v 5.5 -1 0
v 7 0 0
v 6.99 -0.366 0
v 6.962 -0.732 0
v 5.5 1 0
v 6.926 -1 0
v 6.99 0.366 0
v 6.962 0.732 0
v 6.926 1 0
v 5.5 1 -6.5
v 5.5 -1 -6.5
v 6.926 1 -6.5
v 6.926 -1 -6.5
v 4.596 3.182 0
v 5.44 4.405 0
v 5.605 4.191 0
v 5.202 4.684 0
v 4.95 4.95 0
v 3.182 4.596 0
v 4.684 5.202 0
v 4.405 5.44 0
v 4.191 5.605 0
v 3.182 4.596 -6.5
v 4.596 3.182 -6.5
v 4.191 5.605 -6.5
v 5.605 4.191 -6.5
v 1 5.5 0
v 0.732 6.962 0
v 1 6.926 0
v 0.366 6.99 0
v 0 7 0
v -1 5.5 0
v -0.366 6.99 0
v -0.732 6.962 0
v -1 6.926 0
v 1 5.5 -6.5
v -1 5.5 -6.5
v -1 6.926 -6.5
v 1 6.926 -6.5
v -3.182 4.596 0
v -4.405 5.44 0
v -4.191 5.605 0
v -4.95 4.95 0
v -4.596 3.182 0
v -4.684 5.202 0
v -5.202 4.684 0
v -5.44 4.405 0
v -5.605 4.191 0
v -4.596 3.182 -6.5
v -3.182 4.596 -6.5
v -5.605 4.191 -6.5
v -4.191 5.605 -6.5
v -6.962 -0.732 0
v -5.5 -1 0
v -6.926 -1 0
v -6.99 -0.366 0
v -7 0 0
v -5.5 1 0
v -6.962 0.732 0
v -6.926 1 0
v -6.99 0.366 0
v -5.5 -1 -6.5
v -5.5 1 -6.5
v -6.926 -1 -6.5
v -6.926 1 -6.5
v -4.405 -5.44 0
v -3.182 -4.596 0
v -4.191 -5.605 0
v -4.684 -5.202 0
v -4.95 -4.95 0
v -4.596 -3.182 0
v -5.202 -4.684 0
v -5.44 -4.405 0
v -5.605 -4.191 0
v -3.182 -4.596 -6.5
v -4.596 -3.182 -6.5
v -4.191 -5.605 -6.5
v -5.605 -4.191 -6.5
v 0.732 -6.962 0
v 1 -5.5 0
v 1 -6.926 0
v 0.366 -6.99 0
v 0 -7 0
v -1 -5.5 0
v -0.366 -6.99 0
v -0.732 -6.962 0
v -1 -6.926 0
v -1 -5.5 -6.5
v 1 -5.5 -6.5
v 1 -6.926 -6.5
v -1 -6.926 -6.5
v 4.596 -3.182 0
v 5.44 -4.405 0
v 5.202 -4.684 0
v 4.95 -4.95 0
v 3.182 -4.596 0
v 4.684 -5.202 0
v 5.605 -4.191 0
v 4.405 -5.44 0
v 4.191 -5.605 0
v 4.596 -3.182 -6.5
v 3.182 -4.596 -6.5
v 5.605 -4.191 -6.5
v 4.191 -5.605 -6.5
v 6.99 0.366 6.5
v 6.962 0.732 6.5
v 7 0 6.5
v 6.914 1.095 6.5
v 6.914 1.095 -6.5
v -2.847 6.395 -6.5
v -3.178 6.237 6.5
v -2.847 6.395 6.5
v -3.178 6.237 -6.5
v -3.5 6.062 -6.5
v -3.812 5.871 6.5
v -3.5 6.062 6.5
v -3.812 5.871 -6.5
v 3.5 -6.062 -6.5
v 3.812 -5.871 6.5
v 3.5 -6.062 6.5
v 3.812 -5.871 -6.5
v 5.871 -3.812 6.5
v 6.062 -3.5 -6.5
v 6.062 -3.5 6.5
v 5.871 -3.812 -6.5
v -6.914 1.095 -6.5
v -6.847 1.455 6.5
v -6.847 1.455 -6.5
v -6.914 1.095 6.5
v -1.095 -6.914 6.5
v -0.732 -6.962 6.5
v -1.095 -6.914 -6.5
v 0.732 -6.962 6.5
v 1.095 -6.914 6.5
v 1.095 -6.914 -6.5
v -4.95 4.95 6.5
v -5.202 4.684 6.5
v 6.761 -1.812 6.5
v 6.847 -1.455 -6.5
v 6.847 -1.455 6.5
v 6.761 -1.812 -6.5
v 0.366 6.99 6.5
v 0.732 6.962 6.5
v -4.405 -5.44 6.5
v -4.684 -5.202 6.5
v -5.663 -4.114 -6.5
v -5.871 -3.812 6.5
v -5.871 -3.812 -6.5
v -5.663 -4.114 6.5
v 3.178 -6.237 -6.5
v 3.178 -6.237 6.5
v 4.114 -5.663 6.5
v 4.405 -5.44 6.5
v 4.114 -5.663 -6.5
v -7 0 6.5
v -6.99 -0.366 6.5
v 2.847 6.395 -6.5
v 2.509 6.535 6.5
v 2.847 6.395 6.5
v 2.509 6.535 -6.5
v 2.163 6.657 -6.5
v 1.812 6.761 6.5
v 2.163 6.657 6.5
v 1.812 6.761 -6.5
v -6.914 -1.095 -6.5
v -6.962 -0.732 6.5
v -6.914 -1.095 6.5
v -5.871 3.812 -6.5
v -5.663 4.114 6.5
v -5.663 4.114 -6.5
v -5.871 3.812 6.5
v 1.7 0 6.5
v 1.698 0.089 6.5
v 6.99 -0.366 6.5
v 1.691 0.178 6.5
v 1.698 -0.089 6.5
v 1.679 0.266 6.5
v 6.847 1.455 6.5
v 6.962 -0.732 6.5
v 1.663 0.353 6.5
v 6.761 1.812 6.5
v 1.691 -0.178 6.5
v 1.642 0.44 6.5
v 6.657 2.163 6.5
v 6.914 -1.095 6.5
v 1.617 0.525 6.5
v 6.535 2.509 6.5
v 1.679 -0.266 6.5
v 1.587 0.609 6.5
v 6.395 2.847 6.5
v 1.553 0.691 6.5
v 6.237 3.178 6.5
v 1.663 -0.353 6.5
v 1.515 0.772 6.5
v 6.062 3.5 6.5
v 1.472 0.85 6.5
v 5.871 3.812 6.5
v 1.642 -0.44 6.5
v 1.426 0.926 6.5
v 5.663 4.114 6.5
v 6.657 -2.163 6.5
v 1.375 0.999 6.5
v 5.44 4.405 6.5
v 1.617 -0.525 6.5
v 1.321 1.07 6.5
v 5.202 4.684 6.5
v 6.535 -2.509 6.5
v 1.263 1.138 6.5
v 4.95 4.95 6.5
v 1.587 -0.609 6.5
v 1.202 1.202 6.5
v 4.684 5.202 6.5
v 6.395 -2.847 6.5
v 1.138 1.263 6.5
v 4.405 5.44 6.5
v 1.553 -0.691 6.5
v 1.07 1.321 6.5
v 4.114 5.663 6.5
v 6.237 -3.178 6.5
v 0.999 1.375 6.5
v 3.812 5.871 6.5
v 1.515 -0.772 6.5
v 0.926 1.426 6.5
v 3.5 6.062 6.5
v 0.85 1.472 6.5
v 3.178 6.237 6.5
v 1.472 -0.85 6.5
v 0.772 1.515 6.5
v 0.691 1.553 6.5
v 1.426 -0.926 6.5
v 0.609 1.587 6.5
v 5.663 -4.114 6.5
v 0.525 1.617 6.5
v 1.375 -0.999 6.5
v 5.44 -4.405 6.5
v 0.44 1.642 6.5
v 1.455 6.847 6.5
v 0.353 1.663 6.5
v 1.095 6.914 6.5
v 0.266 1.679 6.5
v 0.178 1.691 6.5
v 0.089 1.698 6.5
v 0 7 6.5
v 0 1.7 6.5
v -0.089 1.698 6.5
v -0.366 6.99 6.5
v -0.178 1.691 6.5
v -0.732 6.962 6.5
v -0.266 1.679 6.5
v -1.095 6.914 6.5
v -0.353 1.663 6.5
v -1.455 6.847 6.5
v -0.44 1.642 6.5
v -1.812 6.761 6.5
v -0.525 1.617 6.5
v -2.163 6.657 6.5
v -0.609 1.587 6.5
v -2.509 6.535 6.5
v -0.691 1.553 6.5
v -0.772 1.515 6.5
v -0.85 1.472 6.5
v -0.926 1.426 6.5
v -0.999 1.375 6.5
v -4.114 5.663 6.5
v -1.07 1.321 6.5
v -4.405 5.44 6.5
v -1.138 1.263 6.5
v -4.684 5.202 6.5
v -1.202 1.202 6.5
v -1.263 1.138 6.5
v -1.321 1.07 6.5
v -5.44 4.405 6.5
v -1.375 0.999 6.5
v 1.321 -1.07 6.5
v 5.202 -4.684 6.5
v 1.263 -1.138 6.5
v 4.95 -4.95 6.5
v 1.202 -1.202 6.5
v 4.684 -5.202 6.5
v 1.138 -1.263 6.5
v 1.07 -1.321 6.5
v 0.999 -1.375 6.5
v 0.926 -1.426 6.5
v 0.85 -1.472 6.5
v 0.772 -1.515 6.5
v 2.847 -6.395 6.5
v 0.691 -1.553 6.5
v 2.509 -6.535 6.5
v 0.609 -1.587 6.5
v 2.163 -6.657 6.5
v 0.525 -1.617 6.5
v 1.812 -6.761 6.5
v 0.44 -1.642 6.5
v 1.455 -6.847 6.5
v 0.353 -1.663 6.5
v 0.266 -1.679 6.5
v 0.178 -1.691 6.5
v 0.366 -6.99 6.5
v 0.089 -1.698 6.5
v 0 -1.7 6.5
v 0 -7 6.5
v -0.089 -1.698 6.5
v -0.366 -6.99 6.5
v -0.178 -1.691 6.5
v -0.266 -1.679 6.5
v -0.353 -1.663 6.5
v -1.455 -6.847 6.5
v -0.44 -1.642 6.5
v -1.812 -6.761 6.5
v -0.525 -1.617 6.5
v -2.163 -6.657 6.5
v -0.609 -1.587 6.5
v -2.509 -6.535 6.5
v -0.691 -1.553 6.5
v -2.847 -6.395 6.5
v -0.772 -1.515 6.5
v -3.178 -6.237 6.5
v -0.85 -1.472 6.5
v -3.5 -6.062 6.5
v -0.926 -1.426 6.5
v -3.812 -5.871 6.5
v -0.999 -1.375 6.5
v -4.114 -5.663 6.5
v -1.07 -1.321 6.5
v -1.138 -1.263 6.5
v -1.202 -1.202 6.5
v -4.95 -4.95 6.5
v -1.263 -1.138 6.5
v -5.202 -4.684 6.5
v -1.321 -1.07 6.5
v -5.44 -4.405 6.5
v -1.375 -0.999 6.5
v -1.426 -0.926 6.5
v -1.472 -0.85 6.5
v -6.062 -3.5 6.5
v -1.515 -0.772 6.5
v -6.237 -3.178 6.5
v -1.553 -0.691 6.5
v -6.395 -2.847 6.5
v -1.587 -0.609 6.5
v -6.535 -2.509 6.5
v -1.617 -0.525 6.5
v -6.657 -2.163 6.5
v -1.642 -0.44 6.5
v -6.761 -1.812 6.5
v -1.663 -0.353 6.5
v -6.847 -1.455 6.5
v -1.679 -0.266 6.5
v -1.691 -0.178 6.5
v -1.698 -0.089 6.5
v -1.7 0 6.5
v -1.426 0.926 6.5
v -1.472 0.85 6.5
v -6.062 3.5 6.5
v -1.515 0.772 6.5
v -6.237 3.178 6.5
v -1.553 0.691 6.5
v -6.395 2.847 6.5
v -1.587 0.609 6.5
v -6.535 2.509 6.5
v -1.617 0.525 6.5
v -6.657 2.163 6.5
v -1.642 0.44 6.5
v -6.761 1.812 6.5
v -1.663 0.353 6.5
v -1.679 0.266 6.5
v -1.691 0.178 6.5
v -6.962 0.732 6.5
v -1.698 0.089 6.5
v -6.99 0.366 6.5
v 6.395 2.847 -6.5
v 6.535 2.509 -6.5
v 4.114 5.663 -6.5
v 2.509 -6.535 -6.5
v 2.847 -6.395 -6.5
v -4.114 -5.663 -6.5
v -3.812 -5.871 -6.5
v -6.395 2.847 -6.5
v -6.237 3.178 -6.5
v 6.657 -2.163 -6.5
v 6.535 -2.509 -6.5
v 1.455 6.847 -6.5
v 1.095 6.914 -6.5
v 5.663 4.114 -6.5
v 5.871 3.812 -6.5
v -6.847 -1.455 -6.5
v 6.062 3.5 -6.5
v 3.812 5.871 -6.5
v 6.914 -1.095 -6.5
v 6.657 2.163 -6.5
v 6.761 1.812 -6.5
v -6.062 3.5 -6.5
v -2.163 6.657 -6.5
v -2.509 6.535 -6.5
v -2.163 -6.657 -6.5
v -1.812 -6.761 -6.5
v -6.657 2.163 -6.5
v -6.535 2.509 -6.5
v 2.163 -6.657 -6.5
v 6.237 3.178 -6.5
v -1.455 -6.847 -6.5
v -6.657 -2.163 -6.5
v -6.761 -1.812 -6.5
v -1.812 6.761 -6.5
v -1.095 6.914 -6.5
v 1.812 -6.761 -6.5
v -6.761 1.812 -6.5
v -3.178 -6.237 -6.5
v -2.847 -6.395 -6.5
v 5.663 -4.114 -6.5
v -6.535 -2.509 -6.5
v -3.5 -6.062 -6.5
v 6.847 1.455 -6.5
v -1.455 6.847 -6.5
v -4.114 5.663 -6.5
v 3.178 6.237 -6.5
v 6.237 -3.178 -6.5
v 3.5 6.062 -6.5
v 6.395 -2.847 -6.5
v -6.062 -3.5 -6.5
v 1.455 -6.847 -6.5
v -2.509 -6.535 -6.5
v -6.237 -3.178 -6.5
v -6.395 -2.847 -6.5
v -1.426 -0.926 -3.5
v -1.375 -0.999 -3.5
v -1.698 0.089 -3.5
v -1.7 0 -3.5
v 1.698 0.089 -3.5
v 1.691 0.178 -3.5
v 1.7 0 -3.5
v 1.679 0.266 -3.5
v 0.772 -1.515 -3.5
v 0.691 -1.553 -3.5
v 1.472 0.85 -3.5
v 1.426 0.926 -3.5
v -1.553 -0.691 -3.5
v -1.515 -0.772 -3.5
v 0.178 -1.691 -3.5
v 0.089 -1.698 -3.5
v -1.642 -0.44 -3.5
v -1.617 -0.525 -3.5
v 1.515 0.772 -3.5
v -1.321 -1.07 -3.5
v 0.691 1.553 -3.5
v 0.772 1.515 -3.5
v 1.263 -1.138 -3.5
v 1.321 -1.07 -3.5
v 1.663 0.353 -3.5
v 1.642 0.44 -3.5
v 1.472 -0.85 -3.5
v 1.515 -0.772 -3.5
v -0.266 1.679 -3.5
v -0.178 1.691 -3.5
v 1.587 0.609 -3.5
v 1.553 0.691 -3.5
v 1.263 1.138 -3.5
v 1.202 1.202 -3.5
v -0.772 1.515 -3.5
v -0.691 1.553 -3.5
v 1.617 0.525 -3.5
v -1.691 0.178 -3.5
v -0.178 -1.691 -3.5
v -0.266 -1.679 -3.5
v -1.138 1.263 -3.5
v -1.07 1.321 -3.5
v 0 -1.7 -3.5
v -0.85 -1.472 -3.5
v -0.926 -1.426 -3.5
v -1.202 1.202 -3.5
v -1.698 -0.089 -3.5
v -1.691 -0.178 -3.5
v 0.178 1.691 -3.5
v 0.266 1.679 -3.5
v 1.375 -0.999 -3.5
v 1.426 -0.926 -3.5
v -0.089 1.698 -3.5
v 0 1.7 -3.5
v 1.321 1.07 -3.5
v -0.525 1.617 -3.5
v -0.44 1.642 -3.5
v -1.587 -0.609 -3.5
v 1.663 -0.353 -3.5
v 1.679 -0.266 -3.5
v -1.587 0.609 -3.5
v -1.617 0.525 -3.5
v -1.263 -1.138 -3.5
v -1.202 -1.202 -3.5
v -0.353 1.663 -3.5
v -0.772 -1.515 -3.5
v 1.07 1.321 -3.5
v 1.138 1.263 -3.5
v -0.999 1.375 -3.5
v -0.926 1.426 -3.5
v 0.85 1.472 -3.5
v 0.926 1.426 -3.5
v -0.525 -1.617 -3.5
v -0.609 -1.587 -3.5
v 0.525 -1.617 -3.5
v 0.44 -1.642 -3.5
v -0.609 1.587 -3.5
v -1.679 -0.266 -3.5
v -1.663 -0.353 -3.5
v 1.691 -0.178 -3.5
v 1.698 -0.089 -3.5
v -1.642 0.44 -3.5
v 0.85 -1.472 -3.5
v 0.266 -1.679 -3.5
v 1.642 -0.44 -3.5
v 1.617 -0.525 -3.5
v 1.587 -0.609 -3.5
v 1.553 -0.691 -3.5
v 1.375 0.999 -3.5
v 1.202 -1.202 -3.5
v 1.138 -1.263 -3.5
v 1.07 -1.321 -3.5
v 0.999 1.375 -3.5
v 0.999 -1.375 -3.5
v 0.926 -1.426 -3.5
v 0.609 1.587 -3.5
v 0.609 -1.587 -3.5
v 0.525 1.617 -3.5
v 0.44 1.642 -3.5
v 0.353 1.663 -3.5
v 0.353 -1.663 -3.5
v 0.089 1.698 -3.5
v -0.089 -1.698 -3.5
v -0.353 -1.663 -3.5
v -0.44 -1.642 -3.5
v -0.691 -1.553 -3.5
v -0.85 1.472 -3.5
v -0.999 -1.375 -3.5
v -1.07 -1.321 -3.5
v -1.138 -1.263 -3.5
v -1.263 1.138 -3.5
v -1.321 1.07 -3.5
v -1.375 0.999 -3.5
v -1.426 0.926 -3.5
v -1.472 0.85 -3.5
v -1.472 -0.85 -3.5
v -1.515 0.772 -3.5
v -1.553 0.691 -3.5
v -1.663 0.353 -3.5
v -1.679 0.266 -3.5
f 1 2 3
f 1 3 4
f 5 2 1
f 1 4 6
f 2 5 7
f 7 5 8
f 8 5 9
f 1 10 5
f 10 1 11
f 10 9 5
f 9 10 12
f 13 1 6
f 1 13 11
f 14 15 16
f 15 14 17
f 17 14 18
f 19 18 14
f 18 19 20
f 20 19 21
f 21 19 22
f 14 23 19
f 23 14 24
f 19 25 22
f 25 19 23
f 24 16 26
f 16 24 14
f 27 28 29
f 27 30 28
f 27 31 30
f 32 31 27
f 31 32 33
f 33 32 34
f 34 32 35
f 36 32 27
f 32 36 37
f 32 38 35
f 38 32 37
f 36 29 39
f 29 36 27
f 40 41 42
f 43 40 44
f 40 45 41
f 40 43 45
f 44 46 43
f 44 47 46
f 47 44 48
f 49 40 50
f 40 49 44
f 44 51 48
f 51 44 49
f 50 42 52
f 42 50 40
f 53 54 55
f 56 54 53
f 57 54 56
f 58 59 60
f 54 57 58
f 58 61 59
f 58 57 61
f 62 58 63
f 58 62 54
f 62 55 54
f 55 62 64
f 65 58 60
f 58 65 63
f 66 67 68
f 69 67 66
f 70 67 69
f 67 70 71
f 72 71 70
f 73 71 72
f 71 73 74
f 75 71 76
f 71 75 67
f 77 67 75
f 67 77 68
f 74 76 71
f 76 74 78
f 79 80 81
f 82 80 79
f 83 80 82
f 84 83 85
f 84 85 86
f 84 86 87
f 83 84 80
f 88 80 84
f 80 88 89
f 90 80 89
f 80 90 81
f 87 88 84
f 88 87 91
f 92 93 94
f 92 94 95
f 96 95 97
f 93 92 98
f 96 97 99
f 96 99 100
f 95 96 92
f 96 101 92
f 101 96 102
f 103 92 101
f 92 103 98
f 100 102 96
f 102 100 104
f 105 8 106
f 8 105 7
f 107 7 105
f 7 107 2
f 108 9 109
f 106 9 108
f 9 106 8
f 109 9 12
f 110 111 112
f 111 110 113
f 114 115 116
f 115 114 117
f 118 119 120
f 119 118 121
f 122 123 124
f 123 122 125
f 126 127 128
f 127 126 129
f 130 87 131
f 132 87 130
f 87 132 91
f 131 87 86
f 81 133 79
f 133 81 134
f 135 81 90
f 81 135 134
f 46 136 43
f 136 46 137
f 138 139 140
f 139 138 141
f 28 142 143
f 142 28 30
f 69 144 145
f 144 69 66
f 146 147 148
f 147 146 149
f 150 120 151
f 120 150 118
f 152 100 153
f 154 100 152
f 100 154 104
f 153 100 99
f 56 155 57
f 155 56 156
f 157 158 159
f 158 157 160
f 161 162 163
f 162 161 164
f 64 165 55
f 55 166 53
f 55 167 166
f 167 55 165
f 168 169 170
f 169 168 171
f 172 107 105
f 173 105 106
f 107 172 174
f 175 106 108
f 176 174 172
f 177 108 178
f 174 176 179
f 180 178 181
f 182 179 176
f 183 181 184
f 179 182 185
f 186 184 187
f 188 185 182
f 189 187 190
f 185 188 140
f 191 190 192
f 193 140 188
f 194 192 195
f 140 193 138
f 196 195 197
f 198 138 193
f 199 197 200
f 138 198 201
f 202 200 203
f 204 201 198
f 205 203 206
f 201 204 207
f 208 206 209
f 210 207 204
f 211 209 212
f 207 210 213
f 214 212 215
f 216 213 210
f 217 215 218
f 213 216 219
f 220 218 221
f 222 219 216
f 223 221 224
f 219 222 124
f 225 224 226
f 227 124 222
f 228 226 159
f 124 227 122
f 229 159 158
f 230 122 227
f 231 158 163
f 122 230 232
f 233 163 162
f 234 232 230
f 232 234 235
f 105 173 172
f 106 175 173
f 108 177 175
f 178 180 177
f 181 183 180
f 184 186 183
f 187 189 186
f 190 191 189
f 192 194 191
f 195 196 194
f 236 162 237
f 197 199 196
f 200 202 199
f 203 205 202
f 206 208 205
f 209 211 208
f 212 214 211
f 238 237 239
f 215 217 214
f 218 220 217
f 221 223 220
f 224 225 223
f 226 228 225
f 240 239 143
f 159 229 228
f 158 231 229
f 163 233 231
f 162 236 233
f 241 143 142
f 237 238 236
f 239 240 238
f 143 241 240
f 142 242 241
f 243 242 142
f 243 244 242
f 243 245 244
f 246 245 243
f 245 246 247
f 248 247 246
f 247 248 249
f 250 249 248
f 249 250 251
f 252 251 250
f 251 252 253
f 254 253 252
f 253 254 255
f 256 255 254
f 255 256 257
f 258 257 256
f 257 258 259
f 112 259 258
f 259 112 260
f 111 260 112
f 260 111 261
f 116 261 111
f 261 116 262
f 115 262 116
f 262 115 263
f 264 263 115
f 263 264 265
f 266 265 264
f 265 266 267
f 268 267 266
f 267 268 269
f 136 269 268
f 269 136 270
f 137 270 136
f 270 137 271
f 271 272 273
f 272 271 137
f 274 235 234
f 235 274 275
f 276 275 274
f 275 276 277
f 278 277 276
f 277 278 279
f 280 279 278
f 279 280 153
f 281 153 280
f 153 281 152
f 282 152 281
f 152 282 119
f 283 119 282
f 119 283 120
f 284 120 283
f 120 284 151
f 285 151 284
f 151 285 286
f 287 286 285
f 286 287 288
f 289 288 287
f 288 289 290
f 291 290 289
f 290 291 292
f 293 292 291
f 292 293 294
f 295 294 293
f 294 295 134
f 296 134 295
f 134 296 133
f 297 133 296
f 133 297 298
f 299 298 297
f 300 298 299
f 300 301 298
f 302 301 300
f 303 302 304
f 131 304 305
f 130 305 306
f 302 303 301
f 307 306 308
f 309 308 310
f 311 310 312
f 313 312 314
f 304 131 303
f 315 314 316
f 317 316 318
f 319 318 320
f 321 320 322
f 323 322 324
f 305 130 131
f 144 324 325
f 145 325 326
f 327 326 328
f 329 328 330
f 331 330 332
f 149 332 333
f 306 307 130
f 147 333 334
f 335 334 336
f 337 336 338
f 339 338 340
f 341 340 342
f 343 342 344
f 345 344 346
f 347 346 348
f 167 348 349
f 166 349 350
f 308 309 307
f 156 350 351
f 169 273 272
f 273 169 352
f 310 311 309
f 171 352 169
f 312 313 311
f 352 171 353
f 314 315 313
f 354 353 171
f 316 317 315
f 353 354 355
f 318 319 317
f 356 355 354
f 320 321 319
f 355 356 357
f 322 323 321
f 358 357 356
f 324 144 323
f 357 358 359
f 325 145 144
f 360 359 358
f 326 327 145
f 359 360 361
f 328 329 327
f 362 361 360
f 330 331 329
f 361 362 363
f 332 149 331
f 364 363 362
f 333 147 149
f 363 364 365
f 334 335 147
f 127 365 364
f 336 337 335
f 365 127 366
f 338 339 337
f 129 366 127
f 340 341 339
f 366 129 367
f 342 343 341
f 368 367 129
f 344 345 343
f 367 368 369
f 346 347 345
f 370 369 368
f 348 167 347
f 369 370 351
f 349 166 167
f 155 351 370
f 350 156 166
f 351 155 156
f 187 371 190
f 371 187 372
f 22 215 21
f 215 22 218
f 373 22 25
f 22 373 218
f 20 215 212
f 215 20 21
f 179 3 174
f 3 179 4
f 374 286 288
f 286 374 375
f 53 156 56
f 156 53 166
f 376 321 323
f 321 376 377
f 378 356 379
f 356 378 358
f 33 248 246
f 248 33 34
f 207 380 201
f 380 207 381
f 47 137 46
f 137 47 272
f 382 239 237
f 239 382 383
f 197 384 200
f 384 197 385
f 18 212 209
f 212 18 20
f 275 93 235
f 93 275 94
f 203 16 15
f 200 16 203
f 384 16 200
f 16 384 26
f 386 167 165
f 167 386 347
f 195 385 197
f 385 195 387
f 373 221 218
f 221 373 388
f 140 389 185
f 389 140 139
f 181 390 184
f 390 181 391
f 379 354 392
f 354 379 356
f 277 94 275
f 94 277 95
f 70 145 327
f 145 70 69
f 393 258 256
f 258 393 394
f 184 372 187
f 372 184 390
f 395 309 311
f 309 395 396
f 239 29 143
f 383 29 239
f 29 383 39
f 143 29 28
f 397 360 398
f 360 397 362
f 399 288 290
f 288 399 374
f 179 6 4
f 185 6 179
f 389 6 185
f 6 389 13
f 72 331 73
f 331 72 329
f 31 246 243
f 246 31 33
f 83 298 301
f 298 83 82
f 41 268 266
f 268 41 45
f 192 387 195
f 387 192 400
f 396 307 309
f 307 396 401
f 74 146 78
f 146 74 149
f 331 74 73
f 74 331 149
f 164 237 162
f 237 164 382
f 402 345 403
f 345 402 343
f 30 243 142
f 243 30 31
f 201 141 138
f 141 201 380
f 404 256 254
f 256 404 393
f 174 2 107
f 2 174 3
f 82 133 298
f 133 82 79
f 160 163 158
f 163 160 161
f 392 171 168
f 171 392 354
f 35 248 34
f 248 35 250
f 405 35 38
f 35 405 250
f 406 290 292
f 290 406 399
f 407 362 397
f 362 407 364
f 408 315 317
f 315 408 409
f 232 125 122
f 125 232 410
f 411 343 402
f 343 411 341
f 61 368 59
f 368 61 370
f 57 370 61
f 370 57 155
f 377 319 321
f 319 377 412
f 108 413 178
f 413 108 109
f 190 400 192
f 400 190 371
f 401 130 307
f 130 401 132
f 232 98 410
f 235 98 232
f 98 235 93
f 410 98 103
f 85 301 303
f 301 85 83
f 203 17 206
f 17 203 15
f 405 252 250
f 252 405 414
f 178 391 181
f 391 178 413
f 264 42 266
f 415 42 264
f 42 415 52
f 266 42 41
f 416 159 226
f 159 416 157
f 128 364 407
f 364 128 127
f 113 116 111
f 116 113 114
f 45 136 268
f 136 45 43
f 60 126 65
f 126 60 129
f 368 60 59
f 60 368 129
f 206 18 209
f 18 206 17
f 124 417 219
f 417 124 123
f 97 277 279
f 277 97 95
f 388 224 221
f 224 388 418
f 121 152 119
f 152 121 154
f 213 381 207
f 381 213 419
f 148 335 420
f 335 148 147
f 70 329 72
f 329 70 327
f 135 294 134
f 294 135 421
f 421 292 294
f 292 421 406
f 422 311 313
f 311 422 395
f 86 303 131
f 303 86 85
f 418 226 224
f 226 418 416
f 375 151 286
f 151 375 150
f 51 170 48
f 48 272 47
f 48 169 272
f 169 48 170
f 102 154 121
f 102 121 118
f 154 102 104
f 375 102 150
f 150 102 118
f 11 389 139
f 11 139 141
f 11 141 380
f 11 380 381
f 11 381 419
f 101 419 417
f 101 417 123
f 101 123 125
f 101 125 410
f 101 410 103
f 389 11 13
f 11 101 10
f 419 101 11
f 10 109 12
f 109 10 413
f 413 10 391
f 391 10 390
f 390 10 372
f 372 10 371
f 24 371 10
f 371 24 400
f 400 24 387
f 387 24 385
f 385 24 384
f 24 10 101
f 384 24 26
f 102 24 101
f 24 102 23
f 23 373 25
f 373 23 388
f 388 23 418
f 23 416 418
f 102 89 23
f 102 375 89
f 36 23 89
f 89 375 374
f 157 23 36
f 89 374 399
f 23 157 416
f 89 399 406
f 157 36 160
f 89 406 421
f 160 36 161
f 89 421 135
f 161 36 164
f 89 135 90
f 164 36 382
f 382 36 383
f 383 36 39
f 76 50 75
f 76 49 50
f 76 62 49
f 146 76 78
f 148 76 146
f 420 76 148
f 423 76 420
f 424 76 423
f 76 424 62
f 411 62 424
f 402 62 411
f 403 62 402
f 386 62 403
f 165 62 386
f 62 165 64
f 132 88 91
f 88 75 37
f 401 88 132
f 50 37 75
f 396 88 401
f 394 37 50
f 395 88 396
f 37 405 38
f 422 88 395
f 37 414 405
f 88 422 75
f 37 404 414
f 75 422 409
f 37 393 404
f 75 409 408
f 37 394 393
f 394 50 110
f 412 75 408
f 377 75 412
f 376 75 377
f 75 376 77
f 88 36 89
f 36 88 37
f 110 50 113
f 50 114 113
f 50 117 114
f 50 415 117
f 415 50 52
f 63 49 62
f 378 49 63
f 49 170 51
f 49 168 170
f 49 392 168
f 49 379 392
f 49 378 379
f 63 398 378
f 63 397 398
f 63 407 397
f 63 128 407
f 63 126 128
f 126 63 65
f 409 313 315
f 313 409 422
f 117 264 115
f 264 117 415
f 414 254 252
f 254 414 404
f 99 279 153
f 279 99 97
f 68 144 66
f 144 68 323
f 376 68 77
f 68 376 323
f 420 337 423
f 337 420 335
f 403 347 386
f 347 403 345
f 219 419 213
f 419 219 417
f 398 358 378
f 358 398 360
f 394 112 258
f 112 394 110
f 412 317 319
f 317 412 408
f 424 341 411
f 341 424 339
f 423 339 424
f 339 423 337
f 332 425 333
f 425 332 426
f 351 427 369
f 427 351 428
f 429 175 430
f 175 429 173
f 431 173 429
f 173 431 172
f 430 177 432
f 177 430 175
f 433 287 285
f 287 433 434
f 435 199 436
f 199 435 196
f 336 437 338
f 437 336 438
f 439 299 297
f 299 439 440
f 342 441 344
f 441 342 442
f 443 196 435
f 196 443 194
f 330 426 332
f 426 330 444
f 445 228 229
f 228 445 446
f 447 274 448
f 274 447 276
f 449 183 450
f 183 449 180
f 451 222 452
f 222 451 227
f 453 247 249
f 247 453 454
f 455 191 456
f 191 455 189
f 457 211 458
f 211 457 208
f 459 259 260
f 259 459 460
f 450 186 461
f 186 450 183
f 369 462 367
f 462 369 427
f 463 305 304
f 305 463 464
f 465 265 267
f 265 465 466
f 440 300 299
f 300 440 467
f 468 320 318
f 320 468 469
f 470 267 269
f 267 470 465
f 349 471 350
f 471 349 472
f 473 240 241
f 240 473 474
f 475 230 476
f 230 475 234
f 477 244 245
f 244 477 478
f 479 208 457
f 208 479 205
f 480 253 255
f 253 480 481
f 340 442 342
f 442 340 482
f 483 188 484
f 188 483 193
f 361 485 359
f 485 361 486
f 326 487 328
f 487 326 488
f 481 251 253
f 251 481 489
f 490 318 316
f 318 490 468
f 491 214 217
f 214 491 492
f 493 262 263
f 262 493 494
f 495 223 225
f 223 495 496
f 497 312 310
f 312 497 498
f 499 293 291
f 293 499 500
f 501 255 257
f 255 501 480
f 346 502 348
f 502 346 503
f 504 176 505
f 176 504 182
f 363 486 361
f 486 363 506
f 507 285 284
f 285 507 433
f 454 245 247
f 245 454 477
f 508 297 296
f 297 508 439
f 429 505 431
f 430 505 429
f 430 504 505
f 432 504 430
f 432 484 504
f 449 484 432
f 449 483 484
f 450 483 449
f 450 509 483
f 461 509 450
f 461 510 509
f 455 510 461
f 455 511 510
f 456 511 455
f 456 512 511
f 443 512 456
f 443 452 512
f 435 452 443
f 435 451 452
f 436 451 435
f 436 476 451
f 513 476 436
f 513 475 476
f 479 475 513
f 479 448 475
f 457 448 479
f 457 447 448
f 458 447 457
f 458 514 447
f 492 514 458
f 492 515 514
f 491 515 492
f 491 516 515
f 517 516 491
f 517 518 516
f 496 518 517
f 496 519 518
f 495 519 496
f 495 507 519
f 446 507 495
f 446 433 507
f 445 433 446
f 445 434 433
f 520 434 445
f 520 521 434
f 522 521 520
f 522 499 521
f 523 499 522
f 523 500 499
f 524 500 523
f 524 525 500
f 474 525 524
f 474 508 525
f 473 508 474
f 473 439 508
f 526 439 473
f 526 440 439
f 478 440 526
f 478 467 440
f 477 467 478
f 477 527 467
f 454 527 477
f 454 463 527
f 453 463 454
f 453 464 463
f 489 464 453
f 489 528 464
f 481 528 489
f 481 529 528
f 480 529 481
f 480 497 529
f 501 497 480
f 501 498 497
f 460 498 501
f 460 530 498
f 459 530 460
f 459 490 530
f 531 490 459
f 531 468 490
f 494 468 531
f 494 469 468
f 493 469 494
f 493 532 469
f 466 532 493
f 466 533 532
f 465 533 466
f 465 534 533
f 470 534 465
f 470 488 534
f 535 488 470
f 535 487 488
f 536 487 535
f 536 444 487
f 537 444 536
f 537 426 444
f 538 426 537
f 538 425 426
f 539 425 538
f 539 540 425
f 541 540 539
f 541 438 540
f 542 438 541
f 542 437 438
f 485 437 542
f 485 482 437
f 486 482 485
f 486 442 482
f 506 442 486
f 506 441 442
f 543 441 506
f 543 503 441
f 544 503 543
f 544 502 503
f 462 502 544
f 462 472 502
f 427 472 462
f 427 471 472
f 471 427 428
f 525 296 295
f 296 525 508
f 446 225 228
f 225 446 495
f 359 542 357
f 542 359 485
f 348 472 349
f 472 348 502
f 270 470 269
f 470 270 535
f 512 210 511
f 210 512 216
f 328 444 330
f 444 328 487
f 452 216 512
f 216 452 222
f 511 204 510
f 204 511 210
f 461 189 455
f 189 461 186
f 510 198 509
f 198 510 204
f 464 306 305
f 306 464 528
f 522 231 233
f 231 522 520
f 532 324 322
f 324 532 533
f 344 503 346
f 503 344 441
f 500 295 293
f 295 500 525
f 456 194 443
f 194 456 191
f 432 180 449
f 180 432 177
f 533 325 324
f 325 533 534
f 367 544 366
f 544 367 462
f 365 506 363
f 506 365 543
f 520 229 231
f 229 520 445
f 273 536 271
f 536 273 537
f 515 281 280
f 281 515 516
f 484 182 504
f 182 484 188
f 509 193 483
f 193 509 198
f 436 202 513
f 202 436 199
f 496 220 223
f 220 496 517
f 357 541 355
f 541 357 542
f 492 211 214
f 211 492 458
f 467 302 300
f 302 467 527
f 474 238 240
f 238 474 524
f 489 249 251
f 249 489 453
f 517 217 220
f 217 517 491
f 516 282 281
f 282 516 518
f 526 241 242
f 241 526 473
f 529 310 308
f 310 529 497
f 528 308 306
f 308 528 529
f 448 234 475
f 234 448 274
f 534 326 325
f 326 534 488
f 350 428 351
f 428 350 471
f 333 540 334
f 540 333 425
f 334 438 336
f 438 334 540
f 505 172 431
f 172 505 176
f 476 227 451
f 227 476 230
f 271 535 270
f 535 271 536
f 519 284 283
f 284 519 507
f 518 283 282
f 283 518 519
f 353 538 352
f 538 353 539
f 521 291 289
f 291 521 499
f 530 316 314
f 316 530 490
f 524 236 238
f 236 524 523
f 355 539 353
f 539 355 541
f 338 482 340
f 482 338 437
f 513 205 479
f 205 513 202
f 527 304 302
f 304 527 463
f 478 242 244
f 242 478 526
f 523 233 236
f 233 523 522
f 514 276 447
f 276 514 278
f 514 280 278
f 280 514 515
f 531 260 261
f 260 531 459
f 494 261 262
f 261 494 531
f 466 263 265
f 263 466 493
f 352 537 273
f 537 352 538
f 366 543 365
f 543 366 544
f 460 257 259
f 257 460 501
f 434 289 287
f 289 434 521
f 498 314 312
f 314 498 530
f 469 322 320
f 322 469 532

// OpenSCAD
model = "knob"; // [knob, shaft]

tol = 0.015;
d = 2.19+0.15;
wall = 0.5;
h_top = 10;
h_bot = 2;
h = h_bot+h_top+wall;
hs = 1.52;
sh = 0.76;
$fn = 120;
shaft_diameter = d + 2*wall;

knob_diameter = 14; // outer diameter of knob
knob_top_wall = 3;
knob_height = h_top+knob_top_wall;
notch_depth = 1.5; // depth of side grip notches
notch_count = 8; // number of notches around knob

module shaft() {
    difference() {
        union() {
            cylinder(d=shaft_diameter, h=h, $fn=180, center=true);
            translate([0, 0, h/2-h_bot/2])
                cylinder(d=d + 2 * 2 * wall, h=h_bot, center=true);
        }
        translate([0, 0, (h - hs)/2])
        cylinder(d=d, h=hs, $fn=180, center=true);
    }


    translate([0, 0, (h - hs - sh)/2])
    cube([d, 0.56-tol, sh], center=true);
}

module knob() {    
    difference() {
        // main body
        cylinder(d = knob_diameter, h = knob_height, center=true);

        // shaft hole
        translate([0, 0, knob_top_wall/2])
            #cylinder(d = shaft_diameter + 0.06, h = h_top, center=true);

        // notches
        for (i = [0 : 360/notch_count : 360-360/notch_count]) {
            rotate([0,0,i])
                translate([knob_diameter/2 - notch_depth/2, 0, -knob_height/3])
                    cube([notch_depth, 2, knob_height/3*2], center=true);
        }
    }
}

if (model == "shaft") {
    shaft();
} else if(model == "knob") {
    knob();
}
